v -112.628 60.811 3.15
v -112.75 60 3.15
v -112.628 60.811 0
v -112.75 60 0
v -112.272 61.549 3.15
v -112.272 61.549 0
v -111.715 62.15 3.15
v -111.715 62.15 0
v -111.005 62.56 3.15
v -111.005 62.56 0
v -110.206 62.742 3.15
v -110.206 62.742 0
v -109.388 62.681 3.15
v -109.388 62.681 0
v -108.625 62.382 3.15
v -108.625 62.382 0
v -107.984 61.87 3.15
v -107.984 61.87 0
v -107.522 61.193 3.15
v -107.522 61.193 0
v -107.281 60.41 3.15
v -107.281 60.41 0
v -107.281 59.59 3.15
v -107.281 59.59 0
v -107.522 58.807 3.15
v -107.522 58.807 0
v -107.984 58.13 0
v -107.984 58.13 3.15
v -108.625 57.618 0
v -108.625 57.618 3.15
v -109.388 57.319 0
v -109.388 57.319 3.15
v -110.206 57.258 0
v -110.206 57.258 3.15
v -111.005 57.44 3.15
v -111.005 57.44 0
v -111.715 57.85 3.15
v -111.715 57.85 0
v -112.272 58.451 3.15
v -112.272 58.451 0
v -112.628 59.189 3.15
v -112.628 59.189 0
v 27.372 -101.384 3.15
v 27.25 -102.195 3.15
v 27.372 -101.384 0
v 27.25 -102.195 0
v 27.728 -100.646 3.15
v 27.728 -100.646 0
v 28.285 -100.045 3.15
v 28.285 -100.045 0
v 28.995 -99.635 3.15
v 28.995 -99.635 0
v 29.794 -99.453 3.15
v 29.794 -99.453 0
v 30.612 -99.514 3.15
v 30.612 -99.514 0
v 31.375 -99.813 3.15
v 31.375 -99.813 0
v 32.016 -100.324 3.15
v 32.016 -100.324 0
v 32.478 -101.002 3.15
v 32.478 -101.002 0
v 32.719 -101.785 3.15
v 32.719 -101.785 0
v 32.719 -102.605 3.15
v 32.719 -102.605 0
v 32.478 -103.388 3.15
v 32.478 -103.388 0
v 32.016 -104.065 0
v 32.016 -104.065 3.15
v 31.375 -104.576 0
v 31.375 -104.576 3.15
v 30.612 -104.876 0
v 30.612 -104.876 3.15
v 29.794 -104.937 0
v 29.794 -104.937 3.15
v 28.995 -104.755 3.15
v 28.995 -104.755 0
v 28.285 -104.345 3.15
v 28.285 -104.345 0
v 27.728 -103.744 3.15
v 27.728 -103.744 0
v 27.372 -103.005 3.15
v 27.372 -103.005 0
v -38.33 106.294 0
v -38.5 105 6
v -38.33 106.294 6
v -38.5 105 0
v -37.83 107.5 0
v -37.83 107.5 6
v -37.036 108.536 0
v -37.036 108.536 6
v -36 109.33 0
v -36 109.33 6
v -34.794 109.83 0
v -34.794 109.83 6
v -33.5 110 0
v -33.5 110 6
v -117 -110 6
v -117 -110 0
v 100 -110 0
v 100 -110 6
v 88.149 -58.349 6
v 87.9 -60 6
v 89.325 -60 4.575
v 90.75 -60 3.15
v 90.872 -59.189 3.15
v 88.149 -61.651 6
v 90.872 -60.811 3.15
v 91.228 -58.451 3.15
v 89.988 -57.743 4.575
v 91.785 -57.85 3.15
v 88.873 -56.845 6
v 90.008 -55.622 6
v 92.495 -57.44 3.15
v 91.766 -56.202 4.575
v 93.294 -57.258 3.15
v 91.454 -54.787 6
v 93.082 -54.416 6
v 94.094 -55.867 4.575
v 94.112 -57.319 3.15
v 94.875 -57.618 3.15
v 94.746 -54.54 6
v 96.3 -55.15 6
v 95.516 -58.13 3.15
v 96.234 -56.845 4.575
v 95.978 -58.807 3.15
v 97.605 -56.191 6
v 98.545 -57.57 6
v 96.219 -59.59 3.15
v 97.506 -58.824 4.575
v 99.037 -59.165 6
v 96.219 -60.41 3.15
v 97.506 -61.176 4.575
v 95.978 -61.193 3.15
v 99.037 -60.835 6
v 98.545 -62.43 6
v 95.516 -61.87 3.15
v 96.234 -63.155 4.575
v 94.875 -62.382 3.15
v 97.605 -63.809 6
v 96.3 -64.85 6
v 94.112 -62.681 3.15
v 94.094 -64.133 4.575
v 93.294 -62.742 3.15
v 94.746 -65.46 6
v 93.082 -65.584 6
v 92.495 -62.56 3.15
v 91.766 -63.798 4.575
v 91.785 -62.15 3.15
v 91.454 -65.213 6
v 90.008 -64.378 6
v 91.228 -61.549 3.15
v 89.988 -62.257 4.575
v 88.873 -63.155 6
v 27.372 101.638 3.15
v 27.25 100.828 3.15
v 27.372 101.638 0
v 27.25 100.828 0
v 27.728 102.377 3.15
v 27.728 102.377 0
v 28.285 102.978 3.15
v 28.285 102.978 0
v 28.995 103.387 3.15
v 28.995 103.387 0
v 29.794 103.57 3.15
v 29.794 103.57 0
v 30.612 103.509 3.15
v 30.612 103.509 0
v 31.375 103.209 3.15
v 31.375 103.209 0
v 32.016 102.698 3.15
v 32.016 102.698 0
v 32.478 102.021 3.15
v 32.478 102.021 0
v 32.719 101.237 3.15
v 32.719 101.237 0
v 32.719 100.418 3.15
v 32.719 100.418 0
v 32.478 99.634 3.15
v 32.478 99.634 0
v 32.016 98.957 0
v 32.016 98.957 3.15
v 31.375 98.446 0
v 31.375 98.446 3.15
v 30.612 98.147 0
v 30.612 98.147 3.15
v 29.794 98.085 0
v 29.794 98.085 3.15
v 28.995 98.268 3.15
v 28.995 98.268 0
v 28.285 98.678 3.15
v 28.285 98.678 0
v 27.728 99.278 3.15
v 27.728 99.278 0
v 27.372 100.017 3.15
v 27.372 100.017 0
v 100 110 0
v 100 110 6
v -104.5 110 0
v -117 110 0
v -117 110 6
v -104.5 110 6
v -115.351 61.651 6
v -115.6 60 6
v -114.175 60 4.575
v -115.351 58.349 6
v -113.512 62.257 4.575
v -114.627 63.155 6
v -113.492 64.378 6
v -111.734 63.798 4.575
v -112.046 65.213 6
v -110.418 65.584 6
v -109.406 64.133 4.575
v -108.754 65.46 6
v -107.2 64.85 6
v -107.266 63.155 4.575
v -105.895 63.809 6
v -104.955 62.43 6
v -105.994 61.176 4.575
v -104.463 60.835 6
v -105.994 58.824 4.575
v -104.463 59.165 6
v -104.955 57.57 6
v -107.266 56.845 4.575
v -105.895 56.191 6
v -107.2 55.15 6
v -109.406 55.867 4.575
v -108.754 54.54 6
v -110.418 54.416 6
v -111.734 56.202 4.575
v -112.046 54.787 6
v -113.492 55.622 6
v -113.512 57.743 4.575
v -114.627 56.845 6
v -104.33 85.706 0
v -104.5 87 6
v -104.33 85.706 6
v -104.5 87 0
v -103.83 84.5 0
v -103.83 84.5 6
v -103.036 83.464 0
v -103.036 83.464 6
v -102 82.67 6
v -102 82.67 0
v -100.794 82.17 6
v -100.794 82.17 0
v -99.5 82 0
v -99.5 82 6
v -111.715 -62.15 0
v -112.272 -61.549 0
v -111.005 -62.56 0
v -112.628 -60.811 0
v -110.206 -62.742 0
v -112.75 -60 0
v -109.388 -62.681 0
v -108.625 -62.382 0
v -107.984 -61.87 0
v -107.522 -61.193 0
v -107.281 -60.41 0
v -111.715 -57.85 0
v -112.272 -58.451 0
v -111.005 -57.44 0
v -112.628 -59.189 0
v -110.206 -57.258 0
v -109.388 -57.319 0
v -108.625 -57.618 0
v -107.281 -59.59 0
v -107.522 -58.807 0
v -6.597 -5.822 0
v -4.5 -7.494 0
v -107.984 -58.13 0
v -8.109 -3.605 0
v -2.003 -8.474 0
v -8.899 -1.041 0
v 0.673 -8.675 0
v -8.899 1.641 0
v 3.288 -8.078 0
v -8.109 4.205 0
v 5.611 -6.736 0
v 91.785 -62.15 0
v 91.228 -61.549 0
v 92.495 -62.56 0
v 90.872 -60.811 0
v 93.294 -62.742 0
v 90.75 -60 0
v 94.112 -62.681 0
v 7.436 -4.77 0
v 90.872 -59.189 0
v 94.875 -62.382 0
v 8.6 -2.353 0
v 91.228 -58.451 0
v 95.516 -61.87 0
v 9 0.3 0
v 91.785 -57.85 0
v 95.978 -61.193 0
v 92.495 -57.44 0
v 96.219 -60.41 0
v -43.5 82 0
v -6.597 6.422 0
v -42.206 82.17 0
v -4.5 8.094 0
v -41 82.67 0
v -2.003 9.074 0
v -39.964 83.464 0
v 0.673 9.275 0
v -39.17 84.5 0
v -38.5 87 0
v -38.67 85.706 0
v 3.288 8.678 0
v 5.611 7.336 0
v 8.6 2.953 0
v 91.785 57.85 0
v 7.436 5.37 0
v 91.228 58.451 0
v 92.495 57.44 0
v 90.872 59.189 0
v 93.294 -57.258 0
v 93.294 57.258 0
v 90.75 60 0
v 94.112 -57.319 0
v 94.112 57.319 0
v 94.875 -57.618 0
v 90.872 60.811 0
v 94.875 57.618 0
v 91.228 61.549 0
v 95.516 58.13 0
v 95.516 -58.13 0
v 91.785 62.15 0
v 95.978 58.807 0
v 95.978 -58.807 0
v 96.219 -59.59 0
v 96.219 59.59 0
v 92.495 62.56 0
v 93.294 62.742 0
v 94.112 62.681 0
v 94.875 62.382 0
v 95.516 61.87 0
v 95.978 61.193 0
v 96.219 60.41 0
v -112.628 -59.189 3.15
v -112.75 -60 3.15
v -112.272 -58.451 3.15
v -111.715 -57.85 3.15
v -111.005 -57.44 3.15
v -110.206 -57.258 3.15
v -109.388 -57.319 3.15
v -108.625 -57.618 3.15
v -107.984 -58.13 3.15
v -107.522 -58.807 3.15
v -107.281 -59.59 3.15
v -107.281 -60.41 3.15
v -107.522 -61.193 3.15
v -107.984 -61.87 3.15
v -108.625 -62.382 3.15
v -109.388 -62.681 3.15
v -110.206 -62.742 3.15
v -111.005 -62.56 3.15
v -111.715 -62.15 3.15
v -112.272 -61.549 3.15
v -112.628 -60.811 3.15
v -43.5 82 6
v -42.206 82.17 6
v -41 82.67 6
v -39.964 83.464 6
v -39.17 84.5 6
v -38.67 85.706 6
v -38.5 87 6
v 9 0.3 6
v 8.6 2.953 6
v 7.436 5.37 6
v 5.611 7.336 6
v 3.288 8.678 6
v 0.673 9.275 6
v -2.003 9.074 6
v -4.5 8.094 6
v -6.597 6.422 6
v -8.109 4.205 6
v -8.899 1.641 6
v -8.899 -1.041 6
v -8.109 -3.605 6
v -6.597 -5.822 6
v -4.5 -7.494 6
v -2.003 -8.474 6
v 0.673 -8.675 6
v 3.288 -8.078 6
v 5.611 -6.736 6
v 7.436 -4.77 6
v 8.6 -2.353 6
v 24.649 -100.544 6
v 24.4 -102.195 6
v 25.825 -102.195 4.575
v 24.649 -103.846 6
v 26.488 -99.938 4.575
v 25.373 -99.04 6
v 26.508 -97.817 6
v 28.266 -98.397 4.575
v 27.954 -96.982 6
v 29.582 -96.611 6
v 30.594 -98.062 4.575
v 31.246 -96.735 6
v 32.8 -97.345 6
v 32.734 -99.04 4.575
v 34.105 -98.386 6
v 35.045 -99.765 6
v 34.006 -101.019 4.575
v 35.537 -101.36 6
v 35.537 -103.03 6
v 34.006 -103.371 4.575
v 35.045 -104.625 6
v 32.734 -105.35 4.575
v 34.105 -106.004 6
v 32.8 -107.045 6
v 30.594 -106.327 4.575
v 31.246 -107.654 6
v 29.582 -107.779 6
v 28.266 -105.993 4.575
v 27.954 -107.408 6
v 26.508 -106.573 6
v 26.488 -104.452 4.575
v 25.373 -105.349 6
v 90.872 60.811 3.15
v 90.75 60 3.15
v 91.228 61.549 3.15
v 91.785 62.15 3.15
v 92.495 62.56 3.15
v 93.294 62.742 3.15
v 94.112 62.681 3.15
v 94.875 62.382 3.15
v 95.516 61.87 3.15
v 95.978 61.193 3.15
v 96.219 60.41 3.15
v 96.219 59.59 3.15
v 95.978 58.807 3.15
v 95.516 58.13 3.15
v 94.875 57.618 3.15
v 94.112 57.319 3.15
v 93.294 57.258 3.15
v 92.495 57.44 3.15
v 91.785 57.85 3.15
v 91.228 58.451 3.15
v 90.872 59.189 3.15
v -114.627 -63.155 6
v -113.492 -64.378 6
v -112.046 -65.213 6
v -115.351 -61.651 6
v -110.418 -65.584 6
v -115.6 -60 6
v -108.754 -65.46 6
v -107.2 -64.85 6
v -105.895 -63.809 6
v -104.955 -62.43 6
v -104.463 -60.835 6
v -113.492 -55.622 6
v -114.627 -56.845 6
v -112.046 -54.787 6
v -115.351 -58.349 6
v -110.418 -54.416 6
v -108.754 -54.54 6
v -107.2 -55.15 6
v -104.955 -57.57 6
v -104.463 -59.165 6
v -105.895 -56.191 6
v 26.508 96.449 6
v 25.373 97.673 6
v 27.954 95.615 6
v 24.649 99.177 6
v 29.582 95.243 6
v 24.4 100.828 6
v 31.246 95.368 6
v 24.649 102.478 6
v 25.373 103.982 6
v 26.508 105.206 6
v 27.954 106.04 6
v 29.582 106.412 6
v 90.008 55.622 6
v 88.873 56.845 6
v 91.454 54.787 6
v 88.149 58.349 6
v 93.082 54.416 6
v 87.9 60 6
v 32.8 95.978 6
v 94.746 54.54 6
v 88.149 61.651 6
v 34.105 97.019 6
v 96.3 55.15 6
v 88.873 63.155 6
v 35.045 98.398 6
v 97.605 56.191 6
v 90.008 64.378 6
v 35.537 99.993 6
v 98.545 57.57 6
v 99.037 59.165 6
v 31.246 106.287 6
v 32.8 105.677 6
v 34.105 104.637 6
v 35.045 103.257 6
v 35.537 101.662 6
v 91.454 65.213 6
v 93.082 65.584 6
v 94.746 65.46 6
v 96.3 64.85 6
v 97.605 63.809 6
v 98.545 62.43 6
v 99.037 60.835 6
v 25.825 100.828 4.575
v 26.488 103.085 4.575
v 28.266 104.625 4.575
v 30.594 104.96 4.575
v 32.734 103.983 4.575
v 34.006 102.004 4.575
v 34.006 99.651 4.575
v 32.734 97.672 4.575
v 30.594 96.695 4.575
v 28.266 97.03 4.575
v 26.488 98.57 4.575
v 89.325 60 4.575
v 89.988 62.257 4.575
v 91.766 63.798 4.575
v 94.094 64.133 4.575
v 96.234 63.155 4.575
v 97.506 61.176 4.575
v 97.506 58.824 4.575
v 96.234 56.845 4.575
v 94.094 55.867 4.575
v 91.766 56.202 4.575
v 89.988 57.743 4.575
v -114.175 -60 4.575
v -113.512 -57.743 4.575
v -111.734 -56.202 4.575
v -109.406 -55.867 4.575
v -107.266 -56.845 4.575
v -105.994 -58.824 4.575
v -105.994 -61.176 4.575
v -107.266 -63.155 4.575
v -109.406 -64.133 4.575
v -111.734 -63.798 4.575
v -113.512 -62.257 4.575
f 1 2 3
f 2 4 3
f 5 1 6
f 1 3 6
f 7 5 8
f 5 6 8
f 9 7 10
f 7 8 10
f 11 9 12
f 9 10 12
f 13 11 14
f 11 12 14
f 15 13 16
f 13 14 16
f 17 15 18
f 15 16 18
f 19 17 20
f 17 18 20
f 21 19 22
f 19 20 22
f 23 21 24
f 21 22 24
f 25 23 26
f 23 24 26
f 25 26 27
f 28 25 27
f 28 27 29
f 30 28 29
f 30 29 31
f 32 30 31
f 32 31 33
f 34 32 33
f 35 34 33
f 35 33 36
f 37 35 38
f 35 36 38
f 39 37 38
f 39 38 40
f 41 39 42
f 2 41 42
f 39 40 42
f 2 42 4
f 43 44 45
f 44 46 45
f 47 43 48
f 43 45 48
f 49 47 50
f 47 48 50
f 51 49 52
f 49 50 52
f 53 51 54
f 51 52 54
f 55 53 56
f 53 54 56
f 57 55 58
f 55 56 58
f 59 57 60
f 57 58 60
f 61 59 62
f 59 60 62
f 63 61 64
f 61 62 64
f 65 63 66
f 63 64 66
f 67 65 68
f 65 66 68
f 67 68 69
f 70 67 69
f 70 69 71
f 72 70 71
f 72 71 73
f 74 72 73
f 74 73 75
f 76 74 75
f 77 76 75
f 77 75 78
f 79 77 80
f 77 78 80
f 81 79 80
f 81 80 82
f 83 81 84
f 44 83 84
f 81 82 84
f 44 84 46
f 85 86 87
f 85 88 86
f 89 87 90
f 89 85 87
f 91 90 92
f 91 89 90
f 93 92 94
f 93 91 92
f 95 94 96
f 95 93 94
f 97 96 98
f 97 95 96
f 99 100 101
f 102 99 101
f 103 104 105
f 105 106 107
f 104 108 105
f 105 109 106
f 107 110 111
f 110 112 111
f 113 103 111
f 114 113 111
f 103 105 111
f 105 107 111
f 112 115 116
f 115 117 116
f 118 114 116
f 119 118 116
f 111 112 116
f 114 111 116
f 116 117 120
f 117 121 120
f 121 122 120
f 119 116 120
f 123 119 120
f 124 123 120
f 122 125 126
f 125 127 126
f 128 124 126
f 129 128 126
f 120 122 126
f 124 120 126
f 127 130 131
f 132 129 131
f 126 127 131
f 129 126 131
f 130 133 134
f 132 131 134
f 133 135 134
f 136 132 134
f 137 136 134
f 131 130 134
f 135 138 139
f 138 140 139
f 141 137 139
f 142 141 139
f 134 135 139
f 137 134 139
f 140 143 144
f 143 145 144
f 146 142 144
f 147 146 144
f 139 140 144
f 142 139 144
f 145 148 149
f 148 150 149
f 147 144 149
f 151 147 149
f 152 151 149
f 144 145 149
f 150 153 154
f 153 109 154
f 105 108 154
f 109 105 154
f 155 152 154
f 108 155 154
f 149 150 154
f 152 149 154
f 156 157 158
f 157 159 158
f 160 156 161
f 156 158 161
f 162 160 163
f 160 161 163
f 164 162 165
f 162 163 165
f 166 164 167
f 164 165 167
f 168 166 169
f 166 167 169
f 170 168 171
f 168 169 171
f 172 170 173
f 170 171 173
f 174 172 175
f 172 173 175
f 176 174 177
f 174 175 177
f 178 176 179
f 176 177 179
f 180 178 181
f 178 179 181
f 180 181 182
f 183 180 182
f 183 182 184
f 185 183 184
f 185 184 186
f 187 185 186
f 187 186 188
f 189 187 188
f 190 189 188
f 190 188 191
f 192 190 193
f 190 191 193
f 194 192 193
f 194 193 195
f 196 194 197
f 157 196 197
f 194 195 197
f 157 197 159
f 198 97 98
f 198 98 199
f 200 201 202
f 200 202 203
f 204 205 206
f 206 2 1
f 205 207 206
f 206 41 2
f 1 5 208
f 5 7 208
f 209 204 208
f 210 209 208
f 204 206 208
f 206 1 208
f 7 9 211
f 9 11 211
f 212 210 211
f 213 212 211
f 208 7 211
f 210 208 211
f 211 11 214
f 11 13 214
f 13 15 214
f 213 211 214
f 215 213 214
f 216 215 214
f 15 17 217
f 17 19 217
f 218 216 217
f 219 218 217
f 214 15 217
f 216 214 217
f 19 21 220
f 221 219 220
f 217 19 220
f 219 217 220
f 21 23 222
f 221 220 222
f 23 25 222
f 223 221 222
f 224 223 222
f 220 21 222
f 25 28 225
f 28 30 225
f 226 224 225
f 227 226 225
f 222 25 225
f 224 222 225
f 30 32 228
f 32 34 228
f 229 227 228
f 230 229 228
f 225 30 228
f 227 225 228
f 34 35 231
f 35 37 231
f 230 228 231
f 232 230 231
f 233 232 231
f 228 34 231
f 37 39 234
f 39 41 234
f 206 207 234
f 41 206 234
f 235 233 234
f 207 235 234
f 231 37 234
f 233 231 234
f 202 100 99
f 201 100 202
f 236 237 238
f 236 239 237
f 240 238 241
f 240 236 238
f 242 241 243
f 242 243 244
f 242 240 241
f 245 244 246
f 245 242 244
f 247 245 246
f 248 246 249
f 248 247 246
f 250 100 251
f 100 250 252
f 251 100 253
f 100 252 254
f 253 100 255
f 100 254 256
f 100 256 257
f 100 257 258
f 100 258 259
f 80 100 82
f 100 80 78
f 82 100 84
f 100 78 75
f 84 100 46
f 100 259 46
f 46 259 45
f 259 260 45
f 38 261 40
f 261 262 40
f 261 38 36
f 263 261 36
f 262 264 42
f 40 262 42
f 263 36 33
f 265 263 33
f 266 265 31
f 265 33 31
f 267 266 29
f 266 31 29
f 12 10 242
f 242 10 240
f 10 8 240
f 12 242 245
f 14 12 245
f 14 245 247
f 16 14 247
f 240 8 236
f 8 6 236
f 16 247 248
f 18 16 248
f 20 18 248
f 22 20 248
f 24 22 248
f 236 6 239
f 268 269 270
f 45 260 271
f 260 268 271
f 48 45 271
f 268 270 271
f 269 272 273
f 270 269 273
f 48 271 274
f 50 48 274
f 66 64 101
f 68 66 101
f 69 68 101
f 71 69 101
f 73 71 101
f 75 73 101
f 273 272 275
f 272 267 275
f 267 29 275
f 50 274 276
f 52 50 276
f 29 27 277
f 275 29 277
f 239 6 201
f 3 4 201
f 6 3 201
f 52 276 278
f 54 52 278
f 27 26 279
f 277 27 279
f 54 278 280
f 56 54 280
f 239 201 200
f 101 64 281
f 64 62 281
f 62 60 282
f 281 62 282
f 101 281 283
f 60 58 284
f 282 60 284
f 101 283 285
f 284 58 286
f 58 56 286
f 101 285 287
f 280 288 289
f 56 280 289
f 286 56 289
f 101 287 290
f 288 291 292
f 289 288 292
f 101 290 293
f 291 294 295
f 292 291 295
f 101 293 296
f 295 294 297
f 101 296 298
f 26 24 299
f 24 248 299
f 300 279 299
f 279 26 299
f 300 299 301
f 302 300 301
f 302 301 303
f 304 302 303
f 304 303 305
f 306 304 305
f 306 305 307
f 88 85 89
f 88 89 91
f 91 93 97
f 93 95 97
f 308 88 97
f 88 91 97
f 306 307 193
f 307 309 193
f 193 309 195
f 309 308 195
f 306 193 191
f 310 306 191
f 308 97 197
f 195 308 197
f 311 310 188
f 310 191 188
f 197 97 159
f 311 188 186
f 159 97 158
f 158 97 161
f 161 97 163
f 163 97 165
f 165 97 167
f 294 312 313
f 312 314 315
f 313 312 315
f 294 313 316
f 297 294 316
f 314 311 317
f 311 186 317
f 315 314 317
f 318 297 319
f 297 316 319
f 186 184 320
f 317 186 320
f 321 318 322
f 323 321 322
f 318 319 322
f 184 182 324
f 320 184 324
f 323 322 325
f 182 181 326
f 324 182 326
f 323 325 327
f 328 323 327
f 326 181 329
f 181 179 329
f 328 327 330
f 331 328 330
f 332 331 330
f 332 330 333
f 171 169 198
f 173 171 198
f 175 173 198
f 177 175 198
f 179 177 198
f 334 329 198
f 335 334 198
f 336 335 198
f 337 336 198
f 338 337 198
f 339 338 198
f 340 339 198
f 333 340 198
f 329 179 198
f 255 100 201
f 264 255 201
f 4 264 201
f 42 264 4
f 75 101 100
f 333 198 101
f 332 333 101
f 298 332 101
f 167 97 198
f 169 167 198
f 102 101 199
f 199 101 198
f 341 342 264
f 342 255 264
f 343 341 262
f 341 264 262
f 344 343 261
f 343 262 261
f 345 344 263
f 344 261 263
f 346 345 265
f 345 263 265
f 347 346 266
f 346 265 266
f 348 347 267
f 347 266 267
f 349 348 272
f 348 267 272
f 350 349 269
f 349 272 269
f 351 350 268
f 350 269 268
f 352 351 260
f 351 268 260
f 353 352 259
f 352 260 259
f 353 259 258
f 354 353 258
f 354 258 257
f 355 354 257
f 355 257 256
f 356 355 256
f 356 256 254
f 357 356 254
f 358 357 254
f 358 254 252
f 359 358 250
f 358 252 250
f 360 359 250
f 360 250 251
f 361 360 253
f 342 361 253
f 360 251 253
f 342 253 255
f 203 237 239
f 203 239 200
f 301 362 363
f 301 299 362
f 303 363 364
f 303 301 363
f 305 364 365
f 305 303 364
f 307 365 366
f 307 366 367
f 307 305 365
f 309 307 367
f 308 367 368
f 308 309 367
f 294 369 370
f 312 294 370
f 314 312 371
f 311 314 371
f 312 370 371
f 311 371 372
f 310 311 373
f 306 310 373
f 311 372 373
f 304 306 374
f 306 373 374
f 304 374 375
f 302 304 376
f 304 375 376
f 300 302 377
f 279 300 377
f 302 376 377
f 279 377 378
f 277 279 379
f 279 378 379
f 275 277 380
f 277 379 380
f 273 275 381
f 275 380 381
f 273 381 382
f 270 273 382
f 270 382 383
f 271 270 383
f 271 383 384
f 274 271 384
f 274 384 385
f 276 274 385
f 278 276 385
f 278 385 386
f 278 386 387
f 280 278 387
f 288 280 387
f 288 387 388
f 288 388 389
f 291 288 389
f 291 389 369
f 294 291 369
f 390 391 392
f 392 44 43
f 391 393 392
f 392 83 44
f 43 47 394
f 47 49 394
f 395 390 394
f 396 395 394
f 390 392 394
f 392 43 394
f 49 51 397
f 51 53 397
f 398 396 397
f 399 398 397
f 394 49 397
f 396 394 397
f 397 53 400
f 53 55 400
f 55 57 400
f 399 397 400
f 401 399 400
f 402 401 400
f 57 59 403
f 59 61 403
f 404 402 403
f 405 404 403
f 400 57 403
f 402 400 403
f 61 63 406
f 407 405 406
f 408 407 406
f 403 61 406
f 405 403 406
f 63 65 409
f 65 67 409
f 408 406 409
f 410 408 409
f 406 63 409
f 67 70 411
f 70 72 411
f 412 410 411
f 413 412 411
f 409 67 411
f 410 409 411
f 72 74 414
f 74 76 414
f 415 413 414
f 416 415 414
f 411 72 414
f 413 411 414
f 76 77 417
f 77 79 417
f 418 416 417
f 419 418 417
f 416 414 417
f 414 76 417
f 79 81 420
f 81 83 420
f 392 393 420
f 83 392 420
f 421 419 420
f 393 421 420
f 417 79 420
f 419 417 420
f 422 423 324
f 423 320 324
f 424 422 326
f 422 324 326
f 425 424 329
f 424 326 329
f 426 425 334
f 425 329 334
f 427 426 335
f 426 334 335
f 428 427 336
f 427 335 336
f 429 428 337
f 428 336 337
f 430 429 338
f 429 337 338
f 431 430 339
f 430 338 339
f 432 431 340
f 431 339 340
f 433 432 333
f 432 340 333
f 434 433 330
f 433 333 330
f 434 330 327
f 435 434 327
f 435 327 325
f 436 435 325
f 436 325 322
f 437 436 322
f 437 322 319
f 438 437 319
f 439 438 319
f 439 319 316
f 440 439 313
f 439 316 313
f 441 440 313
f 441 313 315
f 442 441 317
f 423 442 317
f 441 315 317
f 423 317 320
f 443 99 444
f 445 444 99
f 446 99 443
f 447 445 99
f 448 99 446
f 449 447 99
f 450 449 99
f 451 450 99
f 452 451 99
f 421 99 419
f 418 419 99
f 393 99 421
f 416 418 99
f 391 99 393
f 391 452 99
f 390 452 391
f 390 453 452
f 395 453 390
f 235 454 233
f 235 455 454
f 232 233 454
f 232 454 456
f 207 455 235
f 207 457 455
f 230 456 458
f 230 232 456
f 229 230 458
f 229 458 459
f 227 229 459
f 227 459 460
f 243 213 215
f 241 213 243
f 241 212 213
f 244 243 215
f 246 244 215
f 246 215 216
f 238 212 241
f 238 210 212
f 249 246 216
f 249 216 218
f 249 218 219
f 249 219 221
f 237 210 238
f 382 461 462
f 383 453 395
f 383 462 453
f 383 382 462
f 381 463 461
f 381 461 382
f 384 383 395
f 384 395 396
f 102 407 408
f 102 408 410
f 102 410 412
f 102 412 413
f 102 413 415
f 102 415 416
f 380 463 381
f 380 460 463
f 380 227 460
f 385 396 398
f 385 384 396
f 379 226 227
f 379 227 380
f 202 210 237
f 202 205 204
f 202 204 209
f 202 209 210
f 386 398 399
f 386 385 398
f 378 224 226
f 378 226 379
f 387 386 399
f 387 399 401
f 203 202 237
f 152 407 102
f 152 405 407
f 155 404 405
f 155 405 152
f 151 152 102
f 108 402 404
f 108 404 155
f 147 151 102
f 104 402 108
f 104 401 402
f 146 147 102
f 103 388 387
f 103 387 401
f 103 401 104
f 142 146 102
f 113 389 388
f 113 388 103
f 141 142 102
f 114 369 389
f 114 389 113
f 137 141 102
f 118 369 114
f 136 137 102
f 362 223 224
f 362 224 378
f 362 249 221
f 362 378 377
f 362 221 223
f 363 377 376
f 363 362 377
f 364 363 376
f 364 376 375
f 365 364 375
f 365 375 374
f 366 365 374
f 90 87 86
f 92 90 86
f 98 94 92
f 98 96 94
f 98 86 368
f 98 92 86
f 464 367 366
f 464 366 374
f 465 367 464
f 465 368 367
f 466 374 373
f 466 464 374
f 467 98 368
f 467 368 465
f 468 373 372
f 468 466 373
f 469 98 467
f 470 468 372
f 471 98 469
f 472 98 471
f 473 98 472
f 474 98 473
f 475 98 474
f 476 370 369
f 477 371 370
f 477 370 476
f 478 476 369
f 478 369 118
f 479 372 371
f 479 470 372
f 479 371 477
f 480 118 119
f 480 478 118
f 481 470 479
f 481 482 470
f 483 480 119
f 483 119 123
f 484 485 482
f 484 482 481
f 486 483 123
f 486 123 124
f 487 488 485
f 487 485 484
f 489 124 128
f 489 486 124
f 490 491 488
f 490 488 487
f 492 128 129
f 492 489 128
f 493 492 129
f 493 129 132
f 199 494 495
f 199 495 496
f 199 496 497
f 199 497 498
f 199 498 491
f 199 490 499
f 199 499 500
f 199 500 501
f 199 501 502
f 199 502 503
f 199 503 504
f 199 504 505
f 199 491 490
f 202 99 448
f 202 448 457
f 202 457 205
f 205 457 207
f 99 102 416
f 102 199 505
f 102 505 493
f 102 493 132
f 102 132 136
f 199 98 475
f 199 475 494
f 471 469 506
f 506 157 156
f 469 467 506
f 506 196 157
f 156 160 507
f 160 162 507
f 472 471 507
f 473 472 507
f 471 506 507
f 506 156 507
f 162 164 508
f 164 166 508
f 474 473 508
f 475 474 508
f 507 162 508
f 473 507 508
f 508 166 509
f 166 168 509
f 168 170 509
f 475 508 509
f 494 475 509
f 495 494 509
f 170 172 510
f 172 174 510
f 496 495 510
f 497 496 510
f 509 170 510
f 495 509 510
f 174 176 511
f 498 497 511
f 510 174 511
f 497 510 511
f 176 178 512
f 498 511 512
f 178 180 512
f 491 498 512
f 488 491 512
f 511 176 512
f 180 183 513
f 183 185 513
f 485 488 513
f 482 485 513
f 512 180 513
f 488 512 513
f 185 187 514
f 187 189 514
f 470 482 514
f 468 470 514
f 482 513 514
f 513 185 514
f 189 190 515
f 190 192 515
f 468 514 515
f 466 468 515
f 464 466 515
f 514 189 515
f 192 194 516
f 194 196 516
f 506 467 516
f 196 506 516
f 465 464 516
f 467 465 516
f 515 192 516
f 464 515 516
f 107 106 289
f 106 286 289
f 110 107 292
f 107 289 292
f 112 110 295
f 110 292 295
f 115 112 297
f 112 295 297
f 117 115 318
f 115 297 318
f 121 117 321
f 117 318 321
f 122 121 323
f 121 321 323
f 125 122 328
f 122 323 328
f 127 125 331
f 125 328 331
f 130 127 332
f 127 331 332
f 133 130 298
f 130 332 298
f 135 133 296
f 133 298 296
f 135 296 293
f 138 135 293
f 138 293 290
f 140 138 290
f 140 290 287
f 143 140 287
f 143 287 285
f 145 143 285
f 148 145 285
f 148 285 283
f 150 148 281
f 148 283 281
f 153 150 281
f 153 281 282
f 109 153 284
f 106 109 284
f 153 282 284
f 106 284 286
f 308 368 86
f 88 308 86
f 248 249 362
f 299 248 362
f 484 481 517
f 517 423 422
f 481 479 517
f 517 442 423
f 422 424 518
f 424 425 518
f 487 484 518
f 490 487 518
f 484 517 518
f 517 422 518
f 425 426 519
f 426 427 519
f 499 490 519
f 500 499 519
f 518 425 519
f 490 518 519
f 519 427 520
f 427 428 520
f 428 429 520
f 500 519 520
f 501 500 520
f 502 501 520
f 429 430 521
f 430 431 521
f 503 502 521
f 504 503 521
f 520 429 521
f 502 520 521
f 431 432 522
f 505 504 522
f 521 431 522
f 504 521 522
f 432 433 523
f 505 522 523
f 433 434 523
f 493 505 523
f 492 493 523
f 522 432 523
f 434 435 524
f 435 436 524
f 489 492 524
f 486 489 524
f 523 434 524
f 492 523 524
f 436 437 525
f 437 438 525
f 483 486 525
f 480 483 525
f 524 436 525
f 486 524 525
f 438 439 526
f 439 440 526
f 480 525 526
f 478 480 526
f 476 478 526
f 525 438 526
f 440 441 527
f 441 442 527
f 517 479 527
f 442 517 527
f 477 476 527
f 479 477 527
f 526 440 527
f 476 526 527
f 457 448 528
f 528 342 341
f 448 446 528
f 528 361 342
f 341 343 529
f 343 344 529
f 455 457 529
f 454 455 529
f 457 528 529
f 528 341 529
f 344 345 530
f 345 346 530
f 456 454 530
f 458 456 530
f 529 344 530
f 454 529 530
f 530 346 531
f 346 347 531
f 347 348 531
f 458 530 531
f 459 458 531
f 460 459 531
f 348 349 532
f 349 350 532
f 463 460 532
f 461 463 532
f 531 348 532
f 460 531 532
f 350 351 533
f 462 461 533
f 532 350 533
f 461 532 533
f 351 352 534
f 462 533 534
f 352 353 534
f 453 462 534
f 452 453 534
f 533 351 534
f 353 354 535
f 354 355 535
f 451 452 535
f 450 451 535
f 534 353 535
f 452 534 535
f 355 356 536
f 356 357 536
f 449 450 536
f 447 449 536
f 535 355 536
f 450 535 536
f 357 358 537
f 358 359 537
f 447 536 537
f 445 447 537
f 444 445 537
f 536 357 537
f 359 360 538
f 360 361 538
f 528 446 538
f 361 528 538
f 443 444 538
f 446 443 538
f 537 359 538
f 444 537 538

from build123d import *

# Parameters (mm, degrees)
ESBO_O1_W                            = 217
ESBO_O1_H                            = 220
RESSALTO_EXTRUS_O1_DEPTH             = 6
ESCAREADO_PARA_SFHCS_M51_D           = 5.5
ESCAREADO_PARA_SFHCS_M51_CSINK_D     = 11.2
ESCAREADO_PARA_SFHCS_M51_CSINK_ANGLE = 90
CORTE_EXTRUS_O1_REACH                = 162.702
ESBO_O5_R                            = 9
ESBO_O6_W                            = 66
ESBO_O6_H                            = 28
CORTE_EXTRUS_O2_DEPTH                = 161.7015868
FILETE1_R                            = 5


with BuildPart() as part:
    # Esboço1 → Ressalto-extrusão1 (new body)
    with BuildSketch(Plane.XY):
        with Locations((-8.5, 0)):
            Rectangle(ESBO_O1_W, ESBO_O1_H)
    extrude(amount=RESSALTO_EXTRUS_O1_DEPTH)

    # Escareado para SFHCS M51 (through all)
    with Locations(Plane.XY.offset(6)):
        with Locations((-110, -60), (-110, 60), (93.5, 60), (93.5, -60), (30, -102.194888391), (30, 100.827560784)):
            CounterSinkHole(ESCAREADO_PARA_SFHCS_M51_D / 2, ESCAREADO_PARA_SFHCS_M51_CSINK_D / 2, counter_sink_angle=ESCAREADO_PARA_SFHCS_M51_CSINK_ANGLE)

    # Esboço5 → Corte-extrusão1 (cut, up to next)
    with BuildSketch(Plane.XY.offset(6), mode=Mode.PRIVATE) as corte_extrus_o1_sk1:
        with Locations((0, 0.3)):
            Circle(ESBO_O5_R)
    corte_extrus_o1_tool1 = extrude(corte_extrus_o1_sk1.sketch, amount=-CORTE_EXTRUS_O1_REACH, mode=Mode.PRIVATE) & part.part
    add(corte_extrus_o1_tool1.solids().sort_by_distance((0, 0.3, 6))[0], mode=Mode.SUBTRACT)

    # Esboço6 → Corte-extrusão2 (cut, through all)
    with BuildSketch(Plane.XY.offset(6)):
        with Locations((-71.5, 96)):
            Rectangle(ESBO_O6_W, ESBO_O6_H)
    extrude(amount=-CORTE_EXTRUS_O2_DEPTH, mode=Mode.SUBTRACT)

    # Filete1
    filete1_edges = [part.edges().sort_by_distance(p)[0] for p in [
        (-104.5, 82, 3),
        (-38.5, 110, 3),
        (-38.5, 82, 3),
    ]]
    fillet(filete1_edges, radius=FILETE1_R)


solid = part.part
